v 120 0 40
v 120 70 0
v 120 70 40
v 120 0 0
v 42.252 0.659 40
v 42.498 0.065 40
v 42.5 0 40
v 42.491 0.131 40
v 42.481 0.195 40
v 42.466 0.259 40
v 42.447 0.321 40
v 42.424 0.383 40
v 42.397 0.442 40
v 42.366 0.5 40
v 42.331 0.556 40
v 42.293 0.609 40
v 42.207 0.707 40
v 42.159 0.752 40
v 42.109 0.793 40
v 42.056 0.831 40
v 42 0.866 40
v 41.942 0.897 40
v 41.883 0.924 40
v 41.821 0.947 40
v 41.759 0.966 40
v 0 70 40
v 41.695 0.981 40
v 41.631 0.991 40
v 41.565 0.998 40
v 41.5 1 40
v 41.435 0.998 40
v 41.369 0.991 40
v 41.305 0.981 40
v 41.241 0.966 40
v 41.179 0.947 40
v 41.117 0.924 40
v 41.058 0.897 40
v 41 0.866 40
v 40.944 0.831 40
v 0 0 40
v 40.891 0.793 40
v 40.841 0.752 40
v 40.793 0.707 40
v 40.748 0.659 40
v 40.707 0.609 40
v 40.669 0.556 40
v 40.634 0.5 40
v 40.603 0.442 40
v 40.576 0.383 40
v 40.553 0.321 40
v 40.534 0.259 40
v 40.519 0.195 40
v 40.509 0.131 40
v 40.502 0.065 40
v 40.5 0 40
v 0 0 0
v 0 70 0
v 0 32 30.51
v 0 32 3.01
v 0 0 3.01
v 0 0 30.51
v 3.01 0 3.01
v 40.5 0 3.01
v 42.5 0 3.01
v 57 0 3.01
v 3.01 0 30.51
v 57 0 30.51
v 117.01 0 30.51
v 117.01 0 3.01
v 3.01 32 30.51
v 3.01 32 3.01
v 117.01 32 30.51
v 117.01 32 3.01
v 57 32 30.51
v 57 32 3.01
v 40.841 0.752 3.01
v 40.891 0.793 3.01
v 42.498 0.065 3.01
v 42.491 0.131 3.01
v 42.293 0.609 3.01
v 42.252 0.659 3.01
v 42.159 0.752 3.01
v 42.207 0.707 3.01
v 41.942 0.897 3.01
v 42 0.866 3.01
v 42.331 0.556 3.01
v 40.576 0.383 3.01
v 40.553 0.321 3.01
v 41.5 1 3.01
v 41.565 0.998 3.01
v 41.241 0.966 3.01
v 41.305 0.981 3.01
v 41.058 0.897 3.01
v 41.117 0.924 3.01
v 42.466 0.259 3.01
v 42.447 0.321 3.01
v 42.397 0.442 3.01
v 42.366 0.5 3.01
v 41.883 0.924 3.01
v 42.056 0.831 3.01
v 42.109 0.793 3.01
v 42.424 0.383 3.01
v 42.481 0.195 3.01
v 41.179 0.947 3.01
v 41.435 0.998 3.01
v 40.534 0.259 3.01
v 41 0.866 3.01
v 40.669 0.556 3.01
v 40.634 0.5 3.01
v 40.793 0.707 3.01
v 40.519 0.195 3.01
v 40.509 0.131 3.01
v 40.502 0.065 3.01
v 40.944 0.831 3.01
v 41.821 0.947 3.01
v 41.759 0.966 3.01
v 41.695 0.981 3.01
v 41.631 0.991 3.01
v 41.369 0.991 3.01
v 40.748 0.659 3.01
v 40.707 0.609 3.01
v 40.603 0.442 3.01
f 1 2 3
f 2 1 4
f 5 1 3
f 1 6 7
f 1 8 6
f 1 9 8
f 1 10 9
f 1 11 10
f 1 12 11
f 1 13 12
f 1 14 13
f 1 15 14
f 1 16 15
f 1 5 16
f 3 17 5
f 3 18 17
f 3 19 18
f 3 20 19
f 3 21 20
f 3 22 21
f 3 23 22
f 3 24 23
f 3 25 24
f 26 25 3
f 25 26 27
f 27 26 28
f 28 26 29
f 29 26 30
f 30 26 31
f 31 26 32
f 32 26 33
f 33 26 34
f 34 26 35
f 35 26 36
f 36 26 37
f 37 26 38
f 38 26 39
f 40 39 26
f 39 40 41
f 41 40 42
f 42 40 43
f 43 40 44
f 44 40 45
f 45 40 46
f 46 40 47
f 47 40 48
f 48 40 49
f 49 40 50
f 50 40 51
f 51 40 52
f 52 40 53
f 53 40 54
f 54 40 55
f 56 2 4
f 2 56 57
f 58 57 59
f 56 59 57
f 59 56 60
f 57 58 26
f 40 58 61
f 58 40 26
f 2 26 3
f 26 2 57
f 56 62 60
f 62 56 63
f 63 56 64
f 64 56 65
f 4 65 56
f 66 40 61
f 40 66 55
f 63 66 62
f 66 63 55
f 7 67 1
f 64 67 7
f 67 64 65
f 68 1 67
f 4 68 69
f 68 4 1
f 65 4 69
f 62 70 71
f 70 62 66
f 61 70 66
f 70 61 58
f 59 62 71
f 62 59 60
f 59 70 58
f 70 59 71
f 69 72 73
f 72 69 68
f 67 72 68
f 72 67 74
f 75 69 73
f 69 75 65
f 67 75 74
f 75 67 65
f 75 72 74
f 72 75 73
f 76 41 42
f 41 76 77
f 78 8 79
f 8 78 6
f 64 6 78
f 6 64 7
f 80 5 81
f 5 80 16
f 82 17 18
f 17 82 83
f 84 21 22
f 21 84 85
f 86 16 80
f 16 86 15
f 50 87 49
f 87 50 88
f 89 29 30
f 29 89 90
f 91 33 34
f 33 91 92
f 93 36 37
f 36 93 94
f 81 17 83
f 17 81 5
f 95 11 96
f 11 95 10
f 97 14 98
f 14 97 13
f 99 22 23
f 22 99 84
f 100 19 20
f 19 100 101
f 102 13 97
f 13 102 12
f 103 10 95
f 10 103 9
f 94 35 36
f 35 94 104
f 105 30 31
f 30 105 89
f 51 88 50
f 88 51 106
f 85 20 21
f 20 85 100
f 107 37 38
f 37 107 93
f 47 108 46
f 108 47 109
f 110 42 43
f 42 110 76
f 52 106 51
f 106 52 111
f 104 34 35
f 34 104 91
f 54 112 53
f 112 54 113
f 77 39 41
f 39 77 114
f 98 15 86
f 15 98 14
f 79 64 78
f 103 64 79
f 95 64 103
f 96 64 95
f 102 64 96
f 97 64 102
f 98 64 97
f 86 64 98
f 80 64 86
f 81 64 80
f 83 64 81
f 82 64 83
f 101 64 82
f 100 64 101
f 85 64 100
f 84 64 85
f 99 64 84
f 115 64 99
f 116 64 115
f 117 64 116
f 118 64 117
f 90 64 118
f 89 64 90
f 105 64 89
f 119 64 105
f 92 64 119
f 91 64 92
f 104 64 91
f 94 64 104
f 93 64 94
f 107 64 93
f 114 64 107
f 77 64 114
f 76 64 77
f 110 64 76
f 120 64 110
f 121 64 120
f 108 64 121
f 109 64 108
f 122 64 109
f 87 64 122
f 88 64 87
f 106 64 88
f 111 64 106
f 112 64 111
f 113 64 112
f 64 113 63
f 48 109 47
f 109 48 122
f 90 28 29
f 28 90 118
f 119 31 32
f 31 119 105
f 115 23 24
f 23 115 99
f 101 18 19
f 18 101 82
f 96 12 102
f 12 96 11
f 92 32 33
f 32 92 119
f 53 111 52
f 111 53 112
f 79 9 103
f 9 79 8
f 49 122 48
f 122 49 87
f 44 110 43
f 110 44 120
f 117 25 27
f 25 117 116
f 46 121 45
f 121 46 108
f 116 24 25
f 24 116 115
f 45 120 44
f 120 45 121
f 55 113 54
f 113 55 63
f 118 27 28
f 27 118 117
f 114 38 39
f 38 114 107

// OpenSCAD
// Buffer tank for mini horizontal gel-electrophoresis box
// Units: mm. Tank rests on XY plane (z = 0), builds upward.

$fn = 96;

// ---- Tank ----
tank_x      = 120;   // outer length (X)
tank_y      = 70;    // outer width (Y)
tank_h      = 40;    // outer height (Z)
wall        = 3;     // wall thickness
floor_t     = 3;     // floor thickness

// ---- Gel-tray platform ----
plat_x      = 60;    // platform length in X (centred)
plat_top_z  = 10;    // platform top height above inner floor (z = 13)

// ---- Electrode holes ----
hole_d      = 2;     // electrode hole diameter
hole_y      = 0;     // electrode hole Y position
hole_w_z    = tank_h - floor_t; // hole spans from top of floor to tank top

// ---- Cutting overlap ----
eps         = 0.5;   // extension of cutters past faces

// ---- Derived ----
inner_x = tank_x - 2 * wall;          // 114
inner_y = tank_y - 2 * wall;          // 64
inner_z = tank_h - floor_t;           // 37
plat_z0 = floor_t + 0.01;             // platform bottom just above floor

// ---- Model ----
difference() {
    // Open-top tank
    cube([tank_x, tank_y, tank_h]);

    // Two blocks removing the buffer space above the platform
    translate([-inner_x / 2, -inner_y / 2, plat_z0])
        cube([plat_x + 0.01, inner_y, inner_z - plat_top_z + eps]);
    translate([ inner_x / 2, -inner_y / 2, plat_z0])
        cube([plat_x + 0.01, inner_y, inner_z - plat_top_z + eps]);

    // Horizontal electrode holes through each end wall (along X)
    translate([tank_x / 2 - hole_w_z / 2, hole_y, floor_t + 0.01])
        cylinder(d = hole_d, h = hole_w_z);
    translate([-tank_x / 2 + hole_w_z / 2, hole_y, floor_t + 0.01])
        cylinder(d = hole_d, h = hole_w_z);
}
